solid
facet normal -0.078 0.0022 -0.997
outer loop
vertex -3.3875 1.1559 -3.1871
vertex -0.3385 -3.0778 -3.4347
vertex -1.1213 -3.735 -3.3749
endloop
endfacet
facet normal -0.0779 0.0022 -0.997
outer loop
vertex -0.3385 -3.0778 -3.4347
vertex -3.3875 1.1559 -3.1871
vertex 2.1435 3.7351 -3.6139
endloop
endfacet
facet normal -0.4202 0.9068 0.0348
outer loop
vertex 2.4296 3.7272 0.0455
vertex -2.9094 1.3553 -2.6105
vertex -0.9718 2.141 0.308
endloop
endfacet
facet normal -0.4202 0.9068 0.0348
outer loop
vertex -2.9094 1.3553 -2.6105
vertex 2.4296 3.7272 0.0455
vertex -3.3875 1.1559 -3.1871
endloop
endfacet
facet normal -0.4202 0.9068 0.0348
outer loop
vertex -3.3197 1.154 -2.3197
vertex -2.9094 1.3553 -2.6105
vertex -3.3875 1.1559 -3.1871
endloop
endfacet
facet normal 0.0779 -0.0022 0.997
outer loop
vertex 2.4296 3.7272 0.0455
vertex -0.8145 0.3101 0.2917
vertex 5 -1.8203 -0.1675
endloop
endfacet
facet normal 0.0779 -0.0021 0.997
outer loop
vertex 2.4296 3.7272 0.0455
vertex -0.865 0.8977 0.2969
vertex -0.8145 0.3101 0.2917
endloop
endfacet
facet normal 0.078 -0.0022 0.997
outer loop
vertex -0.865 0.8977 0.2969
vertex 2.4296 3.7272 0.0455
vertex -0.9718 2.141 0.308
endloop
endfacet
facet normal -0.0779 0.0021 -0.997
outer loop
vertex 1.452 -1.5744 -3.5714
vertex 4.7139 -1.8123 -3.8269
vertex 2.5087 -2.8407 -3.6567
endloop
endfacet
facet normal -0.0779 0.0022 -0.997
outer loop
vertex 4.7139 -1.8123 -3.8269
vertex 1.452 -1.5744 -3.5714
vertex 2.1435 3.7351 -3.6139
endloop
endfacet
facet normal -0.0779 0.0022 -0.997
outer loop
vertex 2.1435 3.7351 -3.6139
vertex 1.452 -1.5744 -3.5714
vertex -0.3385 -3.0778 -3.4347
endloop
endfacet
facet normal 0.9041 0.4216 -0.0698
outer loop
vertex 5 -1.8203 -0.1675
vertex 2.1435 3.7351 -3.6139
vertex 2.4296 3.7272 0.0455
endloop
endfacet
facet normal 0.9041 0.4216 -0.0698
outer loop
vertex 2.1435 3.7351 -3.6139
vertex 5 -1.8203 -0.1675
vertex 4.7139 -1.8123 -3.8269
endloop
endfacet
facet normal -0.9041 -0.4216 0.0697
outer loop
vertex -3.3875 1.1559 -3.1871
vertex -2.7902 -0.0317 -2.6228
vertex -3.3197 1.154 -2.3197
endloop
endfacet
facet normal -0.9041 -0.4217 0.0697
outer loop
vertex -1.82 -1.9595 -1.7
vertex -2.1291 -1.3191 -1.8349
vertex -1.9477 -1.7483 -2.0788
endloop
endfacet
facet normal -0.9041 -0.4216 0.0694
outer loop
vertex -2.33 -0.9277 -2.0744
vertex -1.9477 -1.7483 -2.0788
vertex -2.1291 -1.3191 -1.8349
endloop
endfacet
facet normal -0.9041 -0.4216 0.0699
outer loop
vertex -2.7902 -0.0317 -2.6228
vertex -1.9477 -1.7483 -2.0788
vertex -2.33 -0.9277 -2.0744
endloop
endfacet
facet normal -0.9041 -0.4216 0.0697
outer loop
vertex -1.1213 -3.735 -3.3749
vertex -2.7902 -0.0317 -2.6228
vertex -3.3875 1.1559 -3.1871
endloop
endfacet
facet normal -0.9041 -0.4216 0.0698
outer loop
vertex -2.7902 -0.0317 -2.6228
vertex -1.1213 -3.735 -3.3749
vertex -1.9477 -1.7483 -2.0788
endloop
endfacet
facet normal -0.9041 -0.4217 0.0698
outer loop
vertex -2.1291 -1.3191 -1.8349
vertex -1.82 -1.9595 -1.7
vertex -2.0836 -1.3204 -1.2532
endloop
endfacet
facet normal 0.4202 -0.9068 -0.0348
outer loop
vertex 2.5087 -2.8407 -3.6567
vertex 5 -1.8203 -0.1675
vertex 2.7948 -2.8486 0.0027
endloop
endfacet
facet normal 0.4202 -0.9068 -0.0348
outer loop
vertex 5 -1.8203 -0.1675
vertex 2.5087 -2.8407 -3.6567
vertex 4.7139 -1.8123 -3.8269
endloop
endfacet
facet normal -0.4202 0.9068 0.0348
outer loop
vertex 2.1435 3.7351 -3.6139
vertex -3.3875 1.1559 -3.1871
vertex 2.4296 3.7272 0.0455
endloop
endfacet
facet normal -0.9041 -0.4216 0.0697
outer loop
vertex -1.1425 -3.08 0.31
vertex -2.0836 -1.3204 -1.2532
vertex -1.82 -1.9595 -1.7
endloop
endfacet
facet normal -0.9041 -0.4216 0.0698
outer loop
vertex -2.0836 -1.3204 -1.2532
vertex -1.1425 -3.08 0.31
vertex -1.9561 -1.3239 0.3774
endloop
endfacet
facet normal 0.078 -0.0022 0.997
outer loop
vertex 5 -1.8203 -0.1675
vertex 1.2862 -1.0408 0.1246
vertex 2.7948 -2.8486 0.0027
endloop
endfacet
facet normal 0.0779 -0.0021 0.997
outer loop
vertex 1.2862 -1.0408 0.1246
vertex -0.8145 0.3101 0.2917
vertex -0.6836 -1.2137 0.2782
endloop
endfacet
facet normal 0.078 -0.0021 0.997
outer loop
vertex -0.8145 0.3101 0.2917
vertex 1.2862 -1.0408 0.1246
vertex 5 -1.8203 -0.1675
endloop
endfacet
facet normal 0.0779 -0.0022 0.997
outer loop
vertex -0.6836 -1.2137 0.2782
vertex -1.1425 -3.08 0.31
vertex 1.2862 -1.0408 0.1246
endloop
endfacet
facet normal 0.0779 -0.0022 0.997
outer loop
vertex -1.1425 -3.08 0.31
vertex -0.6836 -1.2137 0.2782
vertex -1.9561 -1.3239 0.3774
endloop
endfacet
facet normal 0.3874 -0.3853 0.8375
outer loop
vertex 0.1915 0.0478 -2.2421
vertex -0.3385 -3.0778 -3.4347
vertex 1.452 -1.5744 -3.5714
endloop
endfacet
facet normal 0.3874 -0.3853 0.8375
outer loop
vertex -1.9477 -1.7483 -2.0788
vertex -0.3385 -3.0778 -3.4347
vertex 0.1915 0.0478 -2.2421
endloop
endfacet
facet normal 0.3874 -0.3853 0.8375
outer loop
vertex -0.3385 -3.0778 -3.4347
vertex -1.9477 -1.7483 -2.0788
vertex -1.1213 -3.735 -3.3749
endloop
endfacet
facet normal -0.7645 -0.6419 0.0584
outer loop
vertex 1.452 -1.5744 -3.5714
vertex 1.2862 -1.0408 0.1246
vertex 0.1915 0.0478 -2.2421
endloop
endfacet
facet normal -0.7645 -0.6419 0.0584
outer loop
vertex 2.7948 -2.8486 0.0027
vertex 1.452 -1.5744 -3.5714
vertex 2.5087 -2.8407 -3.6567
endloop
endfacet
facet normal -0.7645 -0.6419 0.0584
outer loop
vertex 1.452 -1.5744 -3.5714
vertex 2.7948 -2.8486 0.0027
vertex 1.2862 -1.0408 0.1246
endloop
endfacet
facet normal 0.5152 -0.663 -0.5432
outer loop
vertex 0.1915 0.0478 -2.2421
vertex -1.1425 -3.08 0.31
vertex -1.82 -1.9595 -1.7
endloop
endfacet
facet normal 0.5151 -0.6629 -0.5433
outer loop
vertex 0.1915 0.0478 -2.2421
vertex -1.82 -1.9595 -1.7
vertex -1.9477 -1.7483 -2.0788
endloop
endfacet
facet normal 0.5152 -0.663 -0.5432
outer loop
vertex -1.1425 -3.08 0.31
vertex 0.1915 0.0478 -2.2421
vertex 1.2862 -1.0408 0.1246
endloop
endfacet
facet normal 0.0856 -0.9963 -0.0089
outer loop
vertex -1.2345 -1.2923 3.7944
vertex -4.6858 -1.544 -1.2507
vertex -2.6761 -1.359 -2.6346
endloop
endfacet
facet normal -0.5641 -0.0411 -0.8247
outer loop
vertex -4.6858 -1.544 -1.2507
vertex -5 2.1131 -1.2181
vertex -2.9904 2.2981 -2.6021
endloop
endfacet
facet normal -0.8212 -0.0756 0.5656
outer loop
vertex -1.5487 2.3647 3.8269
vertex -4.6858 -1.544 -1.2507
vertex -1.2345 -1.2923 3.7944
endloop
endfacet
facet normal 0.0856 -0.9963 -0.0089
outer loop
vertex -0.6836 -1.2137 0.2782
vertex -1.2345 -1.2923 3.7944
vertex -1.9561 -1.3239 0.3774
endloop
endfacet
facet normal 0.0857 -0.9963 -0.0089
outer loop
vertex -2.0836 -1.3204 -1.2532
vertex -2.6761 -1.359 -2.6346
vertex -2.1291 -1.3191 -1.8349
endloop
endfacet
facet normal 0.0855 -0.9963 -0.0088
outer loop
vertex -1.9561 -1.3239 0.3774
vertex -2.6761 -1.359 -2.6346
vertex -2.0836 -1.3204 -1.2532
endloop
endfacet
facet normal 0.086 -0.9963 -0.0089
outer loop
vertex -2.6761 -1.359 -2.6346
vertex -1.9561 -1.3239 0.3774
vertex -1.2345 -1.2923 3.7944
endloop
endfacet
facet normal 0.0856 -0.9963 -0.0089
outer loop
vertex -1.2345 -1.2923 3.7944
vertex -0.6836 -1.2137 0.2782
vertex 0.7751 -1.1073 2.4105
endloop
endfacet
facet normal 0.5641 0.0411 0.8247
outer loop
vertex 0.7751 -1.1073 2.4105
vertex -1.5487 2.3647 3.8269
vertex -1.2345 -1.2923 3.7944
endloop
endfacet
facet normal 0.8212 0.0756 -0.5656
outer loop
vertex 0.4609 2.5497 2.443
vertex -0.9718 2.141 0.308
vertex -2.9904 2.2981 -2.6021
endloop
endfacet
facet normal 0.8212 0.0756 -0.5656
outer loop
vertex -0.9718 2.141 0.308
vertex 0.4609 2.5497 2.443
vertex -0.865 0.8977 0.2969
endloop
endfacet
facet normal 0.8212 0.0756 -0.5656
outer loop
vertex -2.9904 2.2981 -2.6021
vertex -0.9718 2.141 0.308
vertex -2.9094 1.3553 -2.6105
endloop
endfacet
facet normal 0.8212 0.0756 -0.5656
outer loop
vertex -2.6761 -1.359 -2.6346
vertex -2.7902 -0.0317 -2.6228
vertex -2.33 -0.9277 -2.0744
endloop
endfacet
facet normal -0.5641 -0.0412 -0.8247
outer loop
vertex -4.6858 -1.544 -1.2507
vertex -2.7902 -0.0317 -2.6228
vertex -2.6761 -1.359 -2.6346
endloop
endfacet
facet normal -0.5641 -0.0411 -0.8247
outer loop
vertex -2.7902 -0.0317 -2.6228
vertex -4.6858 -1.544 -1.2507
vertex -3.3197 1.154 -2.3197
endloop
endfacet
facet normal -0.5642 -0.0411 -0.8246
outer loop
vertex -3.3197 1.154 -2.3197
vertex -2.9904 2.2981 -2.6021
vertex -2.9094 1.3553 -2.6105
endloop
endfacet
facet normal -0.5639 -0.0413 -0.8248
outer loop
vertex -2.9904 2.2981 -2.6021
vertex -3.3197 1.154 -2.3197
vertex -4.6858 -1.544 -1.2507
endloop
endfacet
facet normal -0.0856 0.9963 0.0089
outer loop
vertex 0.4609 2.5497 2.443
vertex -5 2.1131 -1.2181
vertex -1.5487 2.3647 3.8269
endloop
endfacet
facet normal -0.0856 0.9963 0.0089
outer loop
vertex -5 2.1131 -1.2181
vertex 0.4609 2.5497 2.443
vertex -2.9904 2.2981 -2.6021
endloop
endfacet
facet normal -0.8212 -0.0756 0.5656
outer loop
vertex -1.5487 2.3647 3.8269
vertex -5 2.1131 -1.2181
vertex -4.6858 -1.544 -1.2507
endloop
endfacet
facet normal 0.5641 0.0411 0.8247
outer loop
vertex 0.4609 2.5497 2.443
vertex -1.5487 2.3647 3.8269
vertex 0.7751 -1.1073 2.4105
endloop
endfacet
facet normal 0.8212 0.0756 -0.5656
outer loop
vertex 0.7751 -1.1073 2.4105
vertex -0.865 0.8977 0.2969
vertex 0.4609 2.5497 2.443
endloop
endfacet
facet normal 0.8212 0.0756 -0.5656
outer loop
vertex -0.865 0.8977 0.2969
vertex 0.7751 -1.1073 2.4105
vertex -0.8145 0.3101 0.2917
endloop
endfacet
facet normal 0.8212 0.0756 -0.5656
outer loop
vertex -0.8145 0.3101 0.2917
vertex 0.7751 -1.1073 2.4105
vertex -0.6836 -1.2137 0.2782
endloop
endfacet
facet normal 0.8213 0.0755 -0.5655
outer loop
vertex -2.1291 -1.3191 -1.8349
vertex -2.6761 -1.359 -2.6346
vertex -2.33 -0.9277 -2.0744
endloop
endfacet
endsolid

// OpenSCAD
// Begin.
union() {
difference() {
rotate([-178, 4.00022, 25])
translate([0.705871, 0.698352, 1.60863])
cube(size = [6.11776, 6.11771, 3.6706], center = true);

rotate([-147.032, 3.34625, 40.017])
translate([-9.34601, 10.1425, -8.58897])
cube(size = [19.308, 17.7151, 20.8221], center = true);
}

difference() {
rotate([90.6156, 34.4411, 5.25889])
translate([-2.03397, -0.679381, -0.687115])
cube(size = [2.44705, 6.11776, 3.67067], center = true);

rotate([-178, 4.00022, 25])
translate([8.32351, -7.62141, 11.222])
cube(size = [21.353, 22.7572, 15.5561], center = true);
}
}
// End.
